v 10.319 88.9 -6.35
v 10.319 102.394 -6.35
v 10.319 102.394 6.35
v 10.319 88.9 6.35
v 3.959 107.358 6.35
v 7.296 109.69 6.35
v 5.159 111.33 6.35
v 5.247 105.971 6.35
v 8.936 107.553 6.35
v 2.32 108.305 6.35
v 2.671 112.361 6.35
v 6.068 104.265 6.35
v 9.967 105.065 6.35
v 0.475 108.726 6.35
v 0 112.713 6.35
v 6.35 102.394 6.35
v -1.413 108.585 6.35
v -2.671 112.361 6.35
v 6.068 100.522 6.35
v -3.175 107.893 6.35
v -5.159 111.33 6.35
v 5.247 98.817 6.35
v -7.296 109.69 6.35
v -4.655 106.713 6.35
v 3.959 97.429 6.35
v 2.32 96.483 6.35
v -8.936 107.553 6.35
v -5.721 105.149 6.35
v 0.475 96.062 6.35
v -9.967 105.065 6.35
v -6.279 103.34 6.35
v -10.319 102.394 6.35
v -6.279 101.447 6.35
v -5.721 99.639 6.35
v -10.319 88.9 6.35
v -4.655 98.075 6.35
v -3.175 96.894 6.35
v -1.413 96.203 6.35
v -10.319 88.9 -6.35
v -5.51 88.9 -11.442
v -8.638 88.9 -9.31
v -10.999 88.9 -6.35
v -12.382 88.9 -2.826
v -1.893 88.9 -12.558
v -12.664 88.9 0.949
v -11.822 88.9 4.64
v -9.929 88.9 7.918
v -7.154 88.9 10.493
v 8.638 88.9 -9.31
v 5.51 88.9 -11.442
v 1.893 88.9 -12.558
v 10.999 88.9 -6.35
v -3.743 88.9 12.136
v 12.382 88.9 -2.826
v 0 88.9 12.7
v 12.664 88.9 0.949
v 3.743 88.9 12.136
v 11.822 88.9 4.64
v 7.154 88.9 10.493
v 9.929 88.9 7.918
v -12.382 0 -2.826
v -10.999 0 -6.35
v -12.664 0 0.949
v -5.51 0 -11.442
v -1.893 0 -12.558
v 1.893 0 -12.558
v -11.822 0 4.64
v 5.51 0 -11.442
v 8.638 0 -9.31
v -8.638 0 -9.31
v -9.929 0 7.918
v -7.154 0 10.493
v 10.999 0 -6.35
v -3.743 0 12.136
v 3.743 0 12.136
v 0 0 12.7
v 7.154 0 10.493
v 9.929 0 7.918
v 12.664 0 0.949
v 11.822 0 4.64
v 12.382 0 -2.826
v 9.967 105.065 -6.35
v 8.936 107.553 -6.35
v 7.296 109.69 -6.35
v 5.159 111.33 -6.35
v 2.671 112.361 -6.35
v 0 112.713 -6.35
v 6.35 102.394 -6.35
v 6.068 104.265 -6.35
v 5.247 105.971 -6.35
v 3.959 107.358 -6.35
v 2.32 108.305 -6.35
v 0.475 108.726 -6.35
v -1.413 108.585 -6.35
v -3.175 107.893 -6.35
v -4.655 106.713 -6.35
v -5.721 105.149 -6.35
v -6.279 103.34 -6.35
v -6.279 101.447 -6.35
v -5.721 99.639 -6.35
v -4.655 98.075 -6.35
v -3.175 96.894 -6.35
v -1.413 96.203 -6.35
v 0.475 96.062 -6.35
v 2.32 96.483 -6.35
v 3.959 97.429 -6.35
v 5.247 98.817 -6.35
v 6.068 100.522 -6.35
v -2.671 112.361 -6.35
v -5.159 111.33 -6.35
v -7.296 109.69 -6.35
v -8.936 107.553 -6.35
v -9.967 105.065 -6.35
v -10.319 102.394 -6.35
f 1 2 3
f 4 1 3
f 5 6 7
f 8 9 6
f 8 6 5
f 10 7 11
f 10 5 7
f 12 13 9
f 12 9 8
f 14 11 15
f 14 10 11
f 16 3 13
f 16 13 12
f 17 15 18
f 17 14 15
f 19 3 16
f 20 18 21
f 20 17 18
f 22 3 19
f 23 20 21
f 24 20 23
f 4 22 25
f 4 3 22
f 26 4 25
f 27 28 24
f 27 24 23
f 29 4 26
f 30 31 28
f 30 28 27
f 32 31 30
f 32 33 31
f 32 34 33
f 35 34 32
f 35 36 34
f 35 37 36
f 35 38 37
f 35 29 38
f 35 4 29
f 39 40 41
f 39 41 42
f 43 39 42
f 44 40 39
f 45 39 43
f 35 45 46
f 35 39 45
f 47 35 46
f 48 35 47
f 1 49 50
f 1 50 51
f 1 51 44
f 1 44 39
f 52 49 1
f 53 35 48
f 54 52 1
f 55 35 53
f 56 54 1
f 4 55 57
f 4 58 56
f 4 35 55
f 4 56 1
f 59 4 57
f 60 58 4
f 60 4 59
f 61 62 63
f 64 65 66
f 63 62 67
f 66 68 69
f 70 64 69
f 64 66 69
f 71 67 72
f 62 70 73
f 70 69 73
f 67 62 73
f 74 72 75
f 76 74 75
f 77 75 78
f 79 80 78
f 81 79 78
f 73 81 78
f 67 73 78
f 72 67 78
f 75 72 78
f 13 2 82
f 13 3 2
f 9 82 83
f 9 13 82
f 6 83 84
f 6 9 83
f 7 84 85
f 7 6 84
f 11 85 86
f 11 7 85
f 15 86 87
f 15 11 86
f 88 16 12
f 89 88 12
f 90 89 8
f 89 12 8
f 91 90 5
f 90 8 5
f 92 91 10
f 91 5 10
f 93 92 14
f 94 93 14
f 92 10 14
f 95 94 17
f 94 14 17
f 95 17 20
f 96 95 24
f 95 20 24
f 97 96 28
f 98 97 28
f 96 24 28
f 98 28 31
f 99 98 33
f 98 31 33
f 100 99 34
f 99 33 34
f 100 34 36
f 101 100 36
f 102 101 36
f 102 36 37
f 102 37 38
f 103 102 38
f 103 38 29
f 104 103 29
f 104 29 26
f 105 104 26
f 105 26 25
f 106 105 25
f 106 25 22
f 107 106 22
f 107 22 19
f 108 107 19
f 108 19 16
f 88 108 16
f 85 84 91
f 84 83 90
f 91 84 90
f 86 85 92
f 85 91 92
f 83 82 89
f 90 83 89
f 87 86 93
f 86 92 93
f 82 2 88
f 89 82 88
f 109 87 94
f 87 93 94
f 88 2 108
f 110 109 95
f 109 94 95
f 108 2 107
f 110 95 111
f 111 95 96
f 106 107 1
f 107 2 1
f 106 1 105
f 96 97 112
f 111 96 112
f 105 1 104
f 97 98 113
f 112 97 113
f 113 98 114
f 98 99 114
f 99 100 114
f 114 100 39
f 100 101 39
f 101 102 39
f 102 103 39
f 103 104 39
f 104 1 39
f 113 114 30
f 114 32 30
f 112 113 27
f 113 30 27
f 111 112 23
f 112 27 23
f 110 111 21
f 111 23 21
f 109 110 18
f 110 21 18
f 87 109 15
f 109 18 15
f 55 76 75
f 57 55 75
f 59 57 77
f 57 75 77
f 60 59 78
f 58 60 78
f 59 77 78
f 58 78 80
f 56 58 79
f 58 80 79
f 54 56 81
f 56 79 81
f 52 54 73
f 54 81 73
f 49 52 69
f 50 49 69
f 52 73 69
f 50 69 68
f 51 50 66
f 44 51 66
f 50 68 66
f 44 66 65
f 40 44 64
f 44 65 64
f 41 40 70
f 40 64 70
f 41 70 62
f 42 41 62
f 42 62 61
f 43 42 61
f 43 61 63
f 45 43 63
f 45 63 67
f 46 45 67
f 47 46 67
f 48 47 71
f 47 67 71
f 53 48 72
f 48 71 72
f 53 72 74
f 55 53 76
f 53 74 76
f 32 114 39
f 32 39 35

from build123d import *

# Parameters (mm, degrees)
SKETCH1_R          = 12.7
EXTRUDE1_DEPTH     = 88.9
SKETCH2_W          = 20.6375
SKETCH2_H          = 12.7
EXTRUDE2_DEPTH     = 23.8125
FILLET1_R          = 10.31875
SKETCH3_R          = 6.35
CUT_EXTRUDE1_DEPTH = 116.01434761


with BuildPart() as part:
    # Sketch1 → Extrude1 (new body)
    with BuildSketch(Plane(origin=(0, 0, 0), x_dir=(1, 0, 0), z_dir=(0, 1, 0))):
        with Locations(Location((0, 0, 0), (0, 0, 270))):
            Circle(SKETCH1_R)
    extrude(amount=EXTRUDE1_DEPTH)

    # Sketch2 → Extrude2 (add)
    with BuildSketch(Plane(origin=(0, 88.9, 0), x_dir=(-1, 0, 0), z_dir=(0, 1, 0))):
        Rectangle(SKETCH2_W, SKETCH2_H)
    extrude(amount=EXTRUDE2_DEPTH)

    # Fillet1
    fillet1_edges = [part.edges().sort_by_distance(p)[0] for p in [
        (-10.31875, 112.7125, 0),
        (10.31875, 112.7125, 0),
    ]]
    fillet(fillet1_edges, radius=FILLET1_R - 0.0001)  # a hair under: the kernel refuses the full size

    # Sketch3 → Cut-Extrude1 (cut, through all)
    with BuildSketch(Plane.XY.offset(6.35)):
        with Locations((0, 102.39375)):
            Circle(SKETCH3_R)
    extrude(amount=-CUT_EXTRUDE1_DEPTH, mode=Mode.SUBTRACT)


solid = part.part
